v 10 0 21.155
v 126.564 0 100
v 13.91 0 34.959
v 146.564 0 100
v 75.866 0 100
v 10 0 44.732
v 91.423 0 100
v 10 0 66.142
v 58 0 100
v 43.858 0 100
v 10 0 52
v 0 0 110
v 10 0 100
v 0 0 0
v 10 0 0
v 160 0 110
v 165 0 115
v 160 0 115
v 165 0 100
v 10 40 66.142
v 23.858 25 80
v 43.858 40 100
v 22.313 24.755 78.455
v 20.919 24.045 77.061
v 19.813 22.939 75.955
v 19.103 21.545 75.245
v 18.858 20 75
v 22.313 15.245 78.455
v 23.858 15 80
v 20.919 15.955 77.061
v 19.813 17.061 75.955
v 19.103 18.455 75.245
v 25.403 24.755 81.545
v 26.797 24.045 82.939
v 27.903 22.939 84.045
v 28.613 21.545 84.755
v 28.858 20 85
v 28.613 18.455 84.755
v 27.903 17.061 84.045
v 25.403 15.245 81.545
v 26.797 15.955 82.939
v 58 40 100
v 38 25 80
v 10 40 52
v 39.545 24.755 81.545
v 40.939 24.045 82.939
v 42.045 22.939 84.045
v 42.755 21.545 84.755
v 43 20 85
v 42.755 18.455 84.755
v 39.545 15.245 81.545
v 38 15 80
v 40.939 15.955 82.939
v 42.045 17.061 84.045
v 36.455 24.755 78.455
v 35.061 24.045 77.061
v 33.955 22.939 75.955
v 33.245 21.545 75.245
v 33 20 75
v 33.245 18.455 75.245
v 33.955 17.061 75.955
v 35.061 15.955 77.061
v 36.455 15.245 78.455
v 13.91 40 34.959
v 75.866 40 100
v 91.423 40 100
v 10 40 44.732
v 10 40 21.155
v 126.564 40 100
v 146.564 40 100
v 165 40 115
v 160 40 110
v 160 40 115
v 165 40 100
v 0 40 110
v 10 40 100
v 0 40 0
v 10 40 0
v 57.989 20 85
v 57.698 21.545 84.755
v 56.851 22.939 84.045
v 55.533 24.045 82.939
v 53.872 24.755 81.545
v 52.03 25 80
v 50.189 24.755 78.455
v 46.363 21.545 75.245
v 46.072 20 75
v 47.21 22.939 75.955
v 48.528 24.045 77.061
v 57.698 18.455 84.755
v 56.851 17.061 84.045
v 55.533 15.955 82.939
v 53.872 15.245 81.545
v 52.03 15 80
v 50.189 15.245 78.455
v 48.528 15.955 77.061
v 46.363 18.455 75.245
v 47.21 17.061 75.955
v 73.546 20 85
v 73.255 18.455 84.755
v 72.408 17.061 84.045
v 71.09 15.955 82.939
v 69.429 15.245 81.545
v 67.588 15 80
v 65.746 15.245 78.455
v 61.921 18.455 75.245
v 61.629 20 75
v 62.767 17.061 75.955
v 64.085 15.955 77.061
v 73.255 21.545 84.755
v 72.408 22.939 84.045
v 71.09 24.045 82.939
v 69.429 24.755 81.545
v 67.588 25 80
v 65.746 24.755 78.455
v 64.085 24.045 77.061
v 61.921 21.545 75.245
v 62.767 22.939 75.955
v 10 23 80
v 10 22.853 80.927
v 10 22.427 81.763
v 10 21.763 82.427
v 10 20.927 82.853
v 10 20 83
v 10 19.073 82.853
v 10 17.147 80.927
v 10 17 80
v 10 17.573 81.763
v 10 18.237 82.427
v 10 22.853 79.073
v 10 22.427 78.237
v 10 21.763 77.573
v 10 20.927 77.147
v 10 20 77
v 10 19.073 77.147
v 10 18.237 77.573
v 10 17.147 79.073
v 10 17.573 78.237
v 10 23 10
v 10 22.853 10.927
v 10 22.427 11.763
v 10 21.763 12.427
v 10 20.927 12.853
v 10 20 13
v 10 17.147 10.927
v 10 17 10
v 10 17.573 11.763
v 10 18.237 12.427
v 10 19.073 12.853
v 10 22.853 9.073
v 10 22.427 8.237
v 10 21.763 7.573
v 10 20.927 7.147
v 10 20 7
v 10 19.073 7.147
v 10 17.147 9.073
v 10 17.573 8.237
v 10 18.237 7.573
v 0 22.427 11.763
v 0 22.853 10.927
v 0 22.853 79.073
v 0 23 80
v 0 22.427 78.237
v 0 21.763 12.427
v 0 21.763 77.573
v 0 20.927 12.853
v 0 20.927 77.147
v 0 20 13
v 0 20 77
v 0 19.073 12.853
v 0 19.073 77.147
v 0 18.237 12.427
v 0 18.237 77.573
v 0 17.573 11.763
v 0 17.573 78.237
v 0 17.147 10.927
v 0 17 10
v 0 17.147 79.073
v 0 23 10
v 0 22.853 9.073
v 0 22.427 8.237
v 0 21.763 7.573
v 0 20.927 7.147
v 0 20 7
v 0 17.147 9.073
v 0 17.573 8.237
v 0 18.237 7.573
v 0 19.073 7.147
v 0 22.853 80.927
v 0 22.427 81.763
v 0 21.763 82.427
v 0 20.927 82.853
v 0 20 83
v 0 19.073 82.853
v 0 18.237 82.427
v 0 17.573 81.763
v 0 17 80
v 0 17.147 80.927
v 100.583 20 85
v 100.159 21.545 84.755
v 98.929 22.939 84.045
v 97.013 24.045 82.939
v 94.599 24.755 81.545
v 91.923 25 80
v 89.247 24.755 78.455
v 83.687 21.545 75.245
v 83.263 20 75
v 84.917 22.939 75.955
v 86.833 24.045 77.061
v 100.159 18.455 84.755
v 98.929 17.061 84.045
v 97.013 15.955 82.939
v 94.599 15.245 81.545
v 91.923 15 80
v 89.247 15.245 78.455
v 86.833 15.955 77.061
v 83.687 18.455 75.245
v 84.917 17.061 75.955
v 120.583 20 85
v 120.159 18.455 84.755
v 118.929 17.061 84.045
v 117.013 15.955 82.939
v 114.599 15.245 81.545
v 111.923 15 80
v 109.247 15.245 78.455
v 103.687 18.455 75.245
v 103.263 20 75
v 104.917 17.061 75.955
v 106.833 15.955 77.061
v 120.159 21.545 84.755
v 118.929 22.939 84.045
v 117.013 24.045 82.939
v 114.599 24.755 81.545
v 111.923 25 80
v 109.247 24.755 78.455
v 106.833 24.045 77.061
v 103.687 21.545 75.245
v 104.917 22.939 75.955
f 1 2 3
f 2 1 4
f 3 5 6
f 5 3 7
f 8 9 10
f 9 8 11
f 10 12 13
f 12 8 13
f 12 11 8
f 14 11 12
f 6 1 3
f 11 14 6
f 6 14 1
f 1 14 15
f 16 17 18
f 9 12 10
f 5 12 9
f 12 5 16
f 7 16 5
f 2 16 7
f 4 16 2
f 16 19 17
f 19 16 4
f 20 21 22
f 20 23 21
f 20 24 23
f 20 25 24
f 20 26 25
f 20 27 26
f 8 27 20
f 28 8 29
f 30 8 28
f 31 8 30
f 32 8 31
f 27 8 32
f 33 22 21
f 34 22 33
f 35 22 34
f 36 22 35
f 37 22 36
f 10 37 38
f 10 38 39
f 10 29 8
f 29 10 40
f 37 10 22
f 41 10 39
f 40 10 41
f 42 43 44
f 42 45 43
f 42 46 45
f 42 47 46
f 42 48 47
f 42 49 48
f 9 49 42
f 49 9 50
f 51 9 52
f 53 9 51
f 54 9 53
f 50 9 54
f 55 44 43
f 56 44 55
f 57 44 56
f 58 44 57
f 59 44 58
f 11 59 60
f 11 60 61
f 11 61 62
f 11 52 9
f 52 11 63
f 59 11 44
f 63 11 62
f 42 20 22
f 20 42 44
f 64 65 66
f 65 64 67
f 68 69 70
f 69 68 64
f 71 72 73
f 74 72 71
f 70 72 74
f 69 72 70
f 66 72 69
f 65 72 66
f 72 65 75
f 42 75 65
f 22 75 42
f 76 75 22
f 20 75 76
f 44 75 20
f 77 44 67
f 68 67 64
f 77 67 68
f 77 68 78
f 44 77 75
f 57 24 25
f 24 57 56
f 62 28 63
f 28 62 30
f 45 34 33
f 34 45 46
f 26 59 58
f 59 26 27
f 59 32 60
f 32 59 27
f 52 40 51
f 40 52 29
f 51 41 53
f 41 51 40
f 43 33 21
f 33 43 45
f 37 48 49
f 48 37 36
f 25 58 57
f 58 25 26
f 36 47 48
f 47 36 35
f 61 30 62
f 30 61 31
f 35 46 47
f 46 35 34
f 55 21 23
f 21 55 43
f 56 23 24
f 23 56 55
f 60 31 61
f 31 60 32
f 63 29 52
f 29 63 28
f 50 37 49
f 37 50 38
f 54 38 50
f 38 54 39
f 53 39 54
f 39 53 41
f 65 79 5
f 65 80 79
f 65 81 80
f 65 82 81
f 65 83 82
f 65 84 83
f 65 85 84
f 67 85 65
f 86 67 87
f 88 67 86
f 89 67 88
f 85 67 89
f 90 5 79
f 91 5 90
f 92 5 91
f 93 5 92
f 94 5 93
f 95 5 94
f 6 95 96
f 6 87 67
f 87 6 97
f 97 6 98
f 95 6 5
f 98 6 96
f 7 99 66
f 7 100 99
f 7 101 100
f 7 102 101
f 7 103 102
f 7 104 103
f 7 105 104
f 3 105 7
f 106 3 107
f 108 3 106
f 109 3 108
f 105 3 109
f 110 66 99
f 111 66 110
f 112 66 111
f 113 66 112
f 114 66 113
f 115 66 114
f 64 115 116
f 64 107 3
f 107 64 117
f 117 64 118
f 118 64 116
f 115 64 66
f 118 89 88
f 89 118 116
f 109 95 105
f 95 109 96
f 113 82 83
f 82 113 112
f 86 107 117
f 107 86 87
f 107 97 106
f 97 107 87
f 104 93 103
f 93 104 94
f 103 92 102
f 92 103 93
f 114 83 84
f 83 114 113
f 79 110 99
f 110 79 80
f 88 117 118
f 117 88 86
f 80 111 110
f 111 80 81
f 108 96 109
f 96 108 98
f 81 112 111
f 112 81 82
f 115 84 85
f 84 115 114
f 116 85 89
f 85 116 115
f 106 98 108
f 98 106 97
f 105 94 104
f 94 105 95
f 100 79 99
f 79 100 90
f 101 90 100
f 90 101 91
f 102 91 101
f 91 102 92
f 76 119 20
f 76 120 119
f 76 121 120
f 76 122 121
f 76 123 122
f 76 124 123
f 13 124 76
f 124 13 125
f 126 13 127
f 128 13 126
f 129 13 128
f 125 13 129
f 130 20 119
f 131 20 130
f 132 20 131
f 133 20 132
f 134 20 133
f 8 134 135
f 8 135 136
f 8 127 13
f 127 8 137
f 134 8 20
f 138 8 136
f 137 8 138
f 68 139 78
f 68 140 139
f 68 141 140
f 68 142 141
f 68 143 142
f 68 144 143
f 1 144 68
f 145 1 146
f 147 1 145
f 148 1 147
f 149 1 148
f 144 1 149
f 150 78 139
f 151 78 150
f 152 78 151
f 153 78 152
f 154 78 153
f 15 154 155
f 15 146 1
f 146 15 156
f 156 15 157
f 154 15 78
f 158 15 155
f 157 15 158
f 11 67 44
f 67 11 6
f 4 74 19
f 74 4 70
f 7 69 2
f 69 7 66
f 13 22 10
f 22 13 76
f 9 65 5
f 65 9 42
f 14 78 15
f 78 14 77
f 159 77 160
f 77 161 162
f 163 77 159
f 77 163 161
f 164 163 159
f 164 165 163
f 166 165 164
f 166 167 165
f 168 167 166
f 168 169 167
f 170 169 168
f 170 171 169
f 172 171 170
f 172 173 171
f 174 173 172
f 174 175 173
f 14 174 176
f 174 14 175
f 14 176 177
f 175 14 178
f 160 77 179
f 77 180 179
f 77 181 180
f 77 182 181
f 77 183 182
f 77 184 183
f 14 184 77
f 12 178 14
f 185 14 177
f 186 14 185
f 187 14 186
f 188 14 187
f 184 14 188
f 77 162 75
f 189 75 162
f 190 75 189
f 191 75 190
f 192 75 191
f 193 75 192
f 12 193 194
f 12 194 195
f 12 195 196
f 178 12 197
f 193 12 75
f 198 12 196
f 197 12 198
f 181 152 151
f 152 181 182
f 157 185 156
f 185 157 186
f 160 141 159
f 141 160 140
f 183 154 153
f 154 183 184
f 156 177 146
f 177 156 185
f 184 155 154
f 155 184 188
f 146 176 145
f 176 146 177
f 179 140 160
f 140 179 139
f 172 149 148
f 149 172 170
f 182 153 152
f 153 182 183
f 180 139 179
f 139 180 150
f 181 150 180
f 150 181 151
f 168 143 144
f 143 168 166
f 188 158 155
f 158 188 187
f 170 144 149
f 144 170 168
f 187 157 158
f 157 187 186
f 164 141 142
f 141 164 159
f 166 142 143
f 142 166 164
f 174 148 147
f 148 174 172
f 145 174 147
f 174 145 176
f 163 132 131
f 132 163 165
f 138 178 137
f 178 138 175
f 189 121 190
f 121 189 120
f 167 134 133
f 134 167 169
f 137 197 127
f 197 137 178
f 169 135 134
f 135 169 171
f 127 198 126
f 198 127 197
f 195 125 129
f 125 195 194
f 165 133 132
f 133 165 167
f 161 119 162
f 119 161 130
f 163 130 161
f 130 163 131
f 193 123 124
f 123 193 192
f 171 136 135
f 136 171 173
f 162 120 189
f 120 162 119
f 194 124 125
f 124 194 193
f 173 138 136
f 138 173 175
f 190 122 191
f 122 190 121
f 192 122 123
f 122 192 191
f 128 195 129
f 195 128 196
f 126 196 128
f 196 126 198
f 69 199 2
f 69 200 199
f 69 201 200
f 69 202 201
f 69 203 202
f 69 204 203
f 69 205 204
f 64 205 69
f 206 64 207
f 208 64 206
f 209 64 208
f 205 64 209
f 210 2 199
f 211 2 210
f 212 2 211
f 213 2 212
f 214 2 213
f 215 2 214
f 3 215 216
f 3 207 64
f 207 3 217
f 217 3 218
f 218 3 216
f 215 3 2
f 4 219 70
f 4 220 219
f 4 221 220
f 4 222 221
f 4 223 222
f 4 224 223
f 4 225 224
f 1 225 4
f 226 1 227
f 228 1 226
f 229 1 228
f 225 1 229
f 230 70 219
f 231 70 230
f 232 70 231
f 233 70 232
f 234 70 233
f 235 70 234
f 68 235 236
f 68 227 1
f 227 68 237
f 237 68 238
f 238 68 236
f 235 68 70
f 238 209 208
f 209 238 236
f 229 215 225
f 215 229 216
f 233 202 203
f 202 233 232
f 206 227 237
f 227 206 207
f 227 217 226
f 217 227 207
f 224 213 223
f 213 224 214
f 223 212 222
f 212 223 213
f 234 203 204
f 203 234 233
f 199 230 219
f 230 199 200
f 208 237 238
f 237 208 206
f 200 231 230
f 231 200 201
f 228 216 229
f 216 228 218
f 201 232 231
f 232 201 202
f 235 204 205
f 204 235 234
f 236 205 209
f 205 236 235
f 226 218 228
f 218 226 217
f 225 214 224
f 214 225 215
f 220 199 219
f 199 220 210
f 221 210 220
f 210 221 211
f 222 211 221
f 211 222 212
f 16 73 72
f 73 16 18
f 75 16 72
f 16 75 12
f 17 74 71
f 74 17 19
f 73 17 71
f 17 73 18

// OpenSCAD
//Bracket Height (Must be greater than 50)
h=100;
//Shelf Depth
d=160;
//Bracket Width (Must be greater than 15)
w=40;
//Lip Height
l=15;
//Resolution
$fn = 20;

//Matthew Olson
//MSE4777 Fall '18
//This bracket design was made to practice using the Customize it feature of thingiverse.  No structural anaylsis has been completed to ensure the bracket will hold any predetermined amount of weight.  Print at your own risk



translate([0,0,100])

cube([d,w,10]);
if(d>=60){
difference(){
translate([8,0,50])
rotate([0,-45,0])

cube([74,w,10]);
      translate([-1,10,10])
rotate([0,90,0])
cylinder(h=100,r=5);
    translate([-1,.5*w,80])
rotate([0,90,0])
cylinder(h=100,r=5);
}}

if(d>=80){
difference(){
translate([8,0,30])
rotate([0,-40,0])

cube([112,w,10]);
      translate([-1,10,10])
rotate([0,90,0])
cylinder(h=100,r=5);
    translate([-1,.5*w,80])
rotate([0,90,0])
cylinder(h=100,r=5);
}  }

    
difference(){
    translate([0,0,100-h])
cube([10,w,h]);
    translate([-1,.5*w,10])
rotate([0,90,0])
cylinder(h=30,r=3);
    translate([-1,.5*w,80])
rotate([0,90,0])
cylinder(h=30,r=3);
    
}
    translate([d,0,100])
cube([5,w,l]);

if(d>=155){

   difference(){ 
    translate([8,0,20])
rotate([0,-30,0])

cube([160,w,10]);
     translate([-1,.5*w,80])
rotate([0,90,0])
cylinder(h=150,r=5);   
   }}
    
